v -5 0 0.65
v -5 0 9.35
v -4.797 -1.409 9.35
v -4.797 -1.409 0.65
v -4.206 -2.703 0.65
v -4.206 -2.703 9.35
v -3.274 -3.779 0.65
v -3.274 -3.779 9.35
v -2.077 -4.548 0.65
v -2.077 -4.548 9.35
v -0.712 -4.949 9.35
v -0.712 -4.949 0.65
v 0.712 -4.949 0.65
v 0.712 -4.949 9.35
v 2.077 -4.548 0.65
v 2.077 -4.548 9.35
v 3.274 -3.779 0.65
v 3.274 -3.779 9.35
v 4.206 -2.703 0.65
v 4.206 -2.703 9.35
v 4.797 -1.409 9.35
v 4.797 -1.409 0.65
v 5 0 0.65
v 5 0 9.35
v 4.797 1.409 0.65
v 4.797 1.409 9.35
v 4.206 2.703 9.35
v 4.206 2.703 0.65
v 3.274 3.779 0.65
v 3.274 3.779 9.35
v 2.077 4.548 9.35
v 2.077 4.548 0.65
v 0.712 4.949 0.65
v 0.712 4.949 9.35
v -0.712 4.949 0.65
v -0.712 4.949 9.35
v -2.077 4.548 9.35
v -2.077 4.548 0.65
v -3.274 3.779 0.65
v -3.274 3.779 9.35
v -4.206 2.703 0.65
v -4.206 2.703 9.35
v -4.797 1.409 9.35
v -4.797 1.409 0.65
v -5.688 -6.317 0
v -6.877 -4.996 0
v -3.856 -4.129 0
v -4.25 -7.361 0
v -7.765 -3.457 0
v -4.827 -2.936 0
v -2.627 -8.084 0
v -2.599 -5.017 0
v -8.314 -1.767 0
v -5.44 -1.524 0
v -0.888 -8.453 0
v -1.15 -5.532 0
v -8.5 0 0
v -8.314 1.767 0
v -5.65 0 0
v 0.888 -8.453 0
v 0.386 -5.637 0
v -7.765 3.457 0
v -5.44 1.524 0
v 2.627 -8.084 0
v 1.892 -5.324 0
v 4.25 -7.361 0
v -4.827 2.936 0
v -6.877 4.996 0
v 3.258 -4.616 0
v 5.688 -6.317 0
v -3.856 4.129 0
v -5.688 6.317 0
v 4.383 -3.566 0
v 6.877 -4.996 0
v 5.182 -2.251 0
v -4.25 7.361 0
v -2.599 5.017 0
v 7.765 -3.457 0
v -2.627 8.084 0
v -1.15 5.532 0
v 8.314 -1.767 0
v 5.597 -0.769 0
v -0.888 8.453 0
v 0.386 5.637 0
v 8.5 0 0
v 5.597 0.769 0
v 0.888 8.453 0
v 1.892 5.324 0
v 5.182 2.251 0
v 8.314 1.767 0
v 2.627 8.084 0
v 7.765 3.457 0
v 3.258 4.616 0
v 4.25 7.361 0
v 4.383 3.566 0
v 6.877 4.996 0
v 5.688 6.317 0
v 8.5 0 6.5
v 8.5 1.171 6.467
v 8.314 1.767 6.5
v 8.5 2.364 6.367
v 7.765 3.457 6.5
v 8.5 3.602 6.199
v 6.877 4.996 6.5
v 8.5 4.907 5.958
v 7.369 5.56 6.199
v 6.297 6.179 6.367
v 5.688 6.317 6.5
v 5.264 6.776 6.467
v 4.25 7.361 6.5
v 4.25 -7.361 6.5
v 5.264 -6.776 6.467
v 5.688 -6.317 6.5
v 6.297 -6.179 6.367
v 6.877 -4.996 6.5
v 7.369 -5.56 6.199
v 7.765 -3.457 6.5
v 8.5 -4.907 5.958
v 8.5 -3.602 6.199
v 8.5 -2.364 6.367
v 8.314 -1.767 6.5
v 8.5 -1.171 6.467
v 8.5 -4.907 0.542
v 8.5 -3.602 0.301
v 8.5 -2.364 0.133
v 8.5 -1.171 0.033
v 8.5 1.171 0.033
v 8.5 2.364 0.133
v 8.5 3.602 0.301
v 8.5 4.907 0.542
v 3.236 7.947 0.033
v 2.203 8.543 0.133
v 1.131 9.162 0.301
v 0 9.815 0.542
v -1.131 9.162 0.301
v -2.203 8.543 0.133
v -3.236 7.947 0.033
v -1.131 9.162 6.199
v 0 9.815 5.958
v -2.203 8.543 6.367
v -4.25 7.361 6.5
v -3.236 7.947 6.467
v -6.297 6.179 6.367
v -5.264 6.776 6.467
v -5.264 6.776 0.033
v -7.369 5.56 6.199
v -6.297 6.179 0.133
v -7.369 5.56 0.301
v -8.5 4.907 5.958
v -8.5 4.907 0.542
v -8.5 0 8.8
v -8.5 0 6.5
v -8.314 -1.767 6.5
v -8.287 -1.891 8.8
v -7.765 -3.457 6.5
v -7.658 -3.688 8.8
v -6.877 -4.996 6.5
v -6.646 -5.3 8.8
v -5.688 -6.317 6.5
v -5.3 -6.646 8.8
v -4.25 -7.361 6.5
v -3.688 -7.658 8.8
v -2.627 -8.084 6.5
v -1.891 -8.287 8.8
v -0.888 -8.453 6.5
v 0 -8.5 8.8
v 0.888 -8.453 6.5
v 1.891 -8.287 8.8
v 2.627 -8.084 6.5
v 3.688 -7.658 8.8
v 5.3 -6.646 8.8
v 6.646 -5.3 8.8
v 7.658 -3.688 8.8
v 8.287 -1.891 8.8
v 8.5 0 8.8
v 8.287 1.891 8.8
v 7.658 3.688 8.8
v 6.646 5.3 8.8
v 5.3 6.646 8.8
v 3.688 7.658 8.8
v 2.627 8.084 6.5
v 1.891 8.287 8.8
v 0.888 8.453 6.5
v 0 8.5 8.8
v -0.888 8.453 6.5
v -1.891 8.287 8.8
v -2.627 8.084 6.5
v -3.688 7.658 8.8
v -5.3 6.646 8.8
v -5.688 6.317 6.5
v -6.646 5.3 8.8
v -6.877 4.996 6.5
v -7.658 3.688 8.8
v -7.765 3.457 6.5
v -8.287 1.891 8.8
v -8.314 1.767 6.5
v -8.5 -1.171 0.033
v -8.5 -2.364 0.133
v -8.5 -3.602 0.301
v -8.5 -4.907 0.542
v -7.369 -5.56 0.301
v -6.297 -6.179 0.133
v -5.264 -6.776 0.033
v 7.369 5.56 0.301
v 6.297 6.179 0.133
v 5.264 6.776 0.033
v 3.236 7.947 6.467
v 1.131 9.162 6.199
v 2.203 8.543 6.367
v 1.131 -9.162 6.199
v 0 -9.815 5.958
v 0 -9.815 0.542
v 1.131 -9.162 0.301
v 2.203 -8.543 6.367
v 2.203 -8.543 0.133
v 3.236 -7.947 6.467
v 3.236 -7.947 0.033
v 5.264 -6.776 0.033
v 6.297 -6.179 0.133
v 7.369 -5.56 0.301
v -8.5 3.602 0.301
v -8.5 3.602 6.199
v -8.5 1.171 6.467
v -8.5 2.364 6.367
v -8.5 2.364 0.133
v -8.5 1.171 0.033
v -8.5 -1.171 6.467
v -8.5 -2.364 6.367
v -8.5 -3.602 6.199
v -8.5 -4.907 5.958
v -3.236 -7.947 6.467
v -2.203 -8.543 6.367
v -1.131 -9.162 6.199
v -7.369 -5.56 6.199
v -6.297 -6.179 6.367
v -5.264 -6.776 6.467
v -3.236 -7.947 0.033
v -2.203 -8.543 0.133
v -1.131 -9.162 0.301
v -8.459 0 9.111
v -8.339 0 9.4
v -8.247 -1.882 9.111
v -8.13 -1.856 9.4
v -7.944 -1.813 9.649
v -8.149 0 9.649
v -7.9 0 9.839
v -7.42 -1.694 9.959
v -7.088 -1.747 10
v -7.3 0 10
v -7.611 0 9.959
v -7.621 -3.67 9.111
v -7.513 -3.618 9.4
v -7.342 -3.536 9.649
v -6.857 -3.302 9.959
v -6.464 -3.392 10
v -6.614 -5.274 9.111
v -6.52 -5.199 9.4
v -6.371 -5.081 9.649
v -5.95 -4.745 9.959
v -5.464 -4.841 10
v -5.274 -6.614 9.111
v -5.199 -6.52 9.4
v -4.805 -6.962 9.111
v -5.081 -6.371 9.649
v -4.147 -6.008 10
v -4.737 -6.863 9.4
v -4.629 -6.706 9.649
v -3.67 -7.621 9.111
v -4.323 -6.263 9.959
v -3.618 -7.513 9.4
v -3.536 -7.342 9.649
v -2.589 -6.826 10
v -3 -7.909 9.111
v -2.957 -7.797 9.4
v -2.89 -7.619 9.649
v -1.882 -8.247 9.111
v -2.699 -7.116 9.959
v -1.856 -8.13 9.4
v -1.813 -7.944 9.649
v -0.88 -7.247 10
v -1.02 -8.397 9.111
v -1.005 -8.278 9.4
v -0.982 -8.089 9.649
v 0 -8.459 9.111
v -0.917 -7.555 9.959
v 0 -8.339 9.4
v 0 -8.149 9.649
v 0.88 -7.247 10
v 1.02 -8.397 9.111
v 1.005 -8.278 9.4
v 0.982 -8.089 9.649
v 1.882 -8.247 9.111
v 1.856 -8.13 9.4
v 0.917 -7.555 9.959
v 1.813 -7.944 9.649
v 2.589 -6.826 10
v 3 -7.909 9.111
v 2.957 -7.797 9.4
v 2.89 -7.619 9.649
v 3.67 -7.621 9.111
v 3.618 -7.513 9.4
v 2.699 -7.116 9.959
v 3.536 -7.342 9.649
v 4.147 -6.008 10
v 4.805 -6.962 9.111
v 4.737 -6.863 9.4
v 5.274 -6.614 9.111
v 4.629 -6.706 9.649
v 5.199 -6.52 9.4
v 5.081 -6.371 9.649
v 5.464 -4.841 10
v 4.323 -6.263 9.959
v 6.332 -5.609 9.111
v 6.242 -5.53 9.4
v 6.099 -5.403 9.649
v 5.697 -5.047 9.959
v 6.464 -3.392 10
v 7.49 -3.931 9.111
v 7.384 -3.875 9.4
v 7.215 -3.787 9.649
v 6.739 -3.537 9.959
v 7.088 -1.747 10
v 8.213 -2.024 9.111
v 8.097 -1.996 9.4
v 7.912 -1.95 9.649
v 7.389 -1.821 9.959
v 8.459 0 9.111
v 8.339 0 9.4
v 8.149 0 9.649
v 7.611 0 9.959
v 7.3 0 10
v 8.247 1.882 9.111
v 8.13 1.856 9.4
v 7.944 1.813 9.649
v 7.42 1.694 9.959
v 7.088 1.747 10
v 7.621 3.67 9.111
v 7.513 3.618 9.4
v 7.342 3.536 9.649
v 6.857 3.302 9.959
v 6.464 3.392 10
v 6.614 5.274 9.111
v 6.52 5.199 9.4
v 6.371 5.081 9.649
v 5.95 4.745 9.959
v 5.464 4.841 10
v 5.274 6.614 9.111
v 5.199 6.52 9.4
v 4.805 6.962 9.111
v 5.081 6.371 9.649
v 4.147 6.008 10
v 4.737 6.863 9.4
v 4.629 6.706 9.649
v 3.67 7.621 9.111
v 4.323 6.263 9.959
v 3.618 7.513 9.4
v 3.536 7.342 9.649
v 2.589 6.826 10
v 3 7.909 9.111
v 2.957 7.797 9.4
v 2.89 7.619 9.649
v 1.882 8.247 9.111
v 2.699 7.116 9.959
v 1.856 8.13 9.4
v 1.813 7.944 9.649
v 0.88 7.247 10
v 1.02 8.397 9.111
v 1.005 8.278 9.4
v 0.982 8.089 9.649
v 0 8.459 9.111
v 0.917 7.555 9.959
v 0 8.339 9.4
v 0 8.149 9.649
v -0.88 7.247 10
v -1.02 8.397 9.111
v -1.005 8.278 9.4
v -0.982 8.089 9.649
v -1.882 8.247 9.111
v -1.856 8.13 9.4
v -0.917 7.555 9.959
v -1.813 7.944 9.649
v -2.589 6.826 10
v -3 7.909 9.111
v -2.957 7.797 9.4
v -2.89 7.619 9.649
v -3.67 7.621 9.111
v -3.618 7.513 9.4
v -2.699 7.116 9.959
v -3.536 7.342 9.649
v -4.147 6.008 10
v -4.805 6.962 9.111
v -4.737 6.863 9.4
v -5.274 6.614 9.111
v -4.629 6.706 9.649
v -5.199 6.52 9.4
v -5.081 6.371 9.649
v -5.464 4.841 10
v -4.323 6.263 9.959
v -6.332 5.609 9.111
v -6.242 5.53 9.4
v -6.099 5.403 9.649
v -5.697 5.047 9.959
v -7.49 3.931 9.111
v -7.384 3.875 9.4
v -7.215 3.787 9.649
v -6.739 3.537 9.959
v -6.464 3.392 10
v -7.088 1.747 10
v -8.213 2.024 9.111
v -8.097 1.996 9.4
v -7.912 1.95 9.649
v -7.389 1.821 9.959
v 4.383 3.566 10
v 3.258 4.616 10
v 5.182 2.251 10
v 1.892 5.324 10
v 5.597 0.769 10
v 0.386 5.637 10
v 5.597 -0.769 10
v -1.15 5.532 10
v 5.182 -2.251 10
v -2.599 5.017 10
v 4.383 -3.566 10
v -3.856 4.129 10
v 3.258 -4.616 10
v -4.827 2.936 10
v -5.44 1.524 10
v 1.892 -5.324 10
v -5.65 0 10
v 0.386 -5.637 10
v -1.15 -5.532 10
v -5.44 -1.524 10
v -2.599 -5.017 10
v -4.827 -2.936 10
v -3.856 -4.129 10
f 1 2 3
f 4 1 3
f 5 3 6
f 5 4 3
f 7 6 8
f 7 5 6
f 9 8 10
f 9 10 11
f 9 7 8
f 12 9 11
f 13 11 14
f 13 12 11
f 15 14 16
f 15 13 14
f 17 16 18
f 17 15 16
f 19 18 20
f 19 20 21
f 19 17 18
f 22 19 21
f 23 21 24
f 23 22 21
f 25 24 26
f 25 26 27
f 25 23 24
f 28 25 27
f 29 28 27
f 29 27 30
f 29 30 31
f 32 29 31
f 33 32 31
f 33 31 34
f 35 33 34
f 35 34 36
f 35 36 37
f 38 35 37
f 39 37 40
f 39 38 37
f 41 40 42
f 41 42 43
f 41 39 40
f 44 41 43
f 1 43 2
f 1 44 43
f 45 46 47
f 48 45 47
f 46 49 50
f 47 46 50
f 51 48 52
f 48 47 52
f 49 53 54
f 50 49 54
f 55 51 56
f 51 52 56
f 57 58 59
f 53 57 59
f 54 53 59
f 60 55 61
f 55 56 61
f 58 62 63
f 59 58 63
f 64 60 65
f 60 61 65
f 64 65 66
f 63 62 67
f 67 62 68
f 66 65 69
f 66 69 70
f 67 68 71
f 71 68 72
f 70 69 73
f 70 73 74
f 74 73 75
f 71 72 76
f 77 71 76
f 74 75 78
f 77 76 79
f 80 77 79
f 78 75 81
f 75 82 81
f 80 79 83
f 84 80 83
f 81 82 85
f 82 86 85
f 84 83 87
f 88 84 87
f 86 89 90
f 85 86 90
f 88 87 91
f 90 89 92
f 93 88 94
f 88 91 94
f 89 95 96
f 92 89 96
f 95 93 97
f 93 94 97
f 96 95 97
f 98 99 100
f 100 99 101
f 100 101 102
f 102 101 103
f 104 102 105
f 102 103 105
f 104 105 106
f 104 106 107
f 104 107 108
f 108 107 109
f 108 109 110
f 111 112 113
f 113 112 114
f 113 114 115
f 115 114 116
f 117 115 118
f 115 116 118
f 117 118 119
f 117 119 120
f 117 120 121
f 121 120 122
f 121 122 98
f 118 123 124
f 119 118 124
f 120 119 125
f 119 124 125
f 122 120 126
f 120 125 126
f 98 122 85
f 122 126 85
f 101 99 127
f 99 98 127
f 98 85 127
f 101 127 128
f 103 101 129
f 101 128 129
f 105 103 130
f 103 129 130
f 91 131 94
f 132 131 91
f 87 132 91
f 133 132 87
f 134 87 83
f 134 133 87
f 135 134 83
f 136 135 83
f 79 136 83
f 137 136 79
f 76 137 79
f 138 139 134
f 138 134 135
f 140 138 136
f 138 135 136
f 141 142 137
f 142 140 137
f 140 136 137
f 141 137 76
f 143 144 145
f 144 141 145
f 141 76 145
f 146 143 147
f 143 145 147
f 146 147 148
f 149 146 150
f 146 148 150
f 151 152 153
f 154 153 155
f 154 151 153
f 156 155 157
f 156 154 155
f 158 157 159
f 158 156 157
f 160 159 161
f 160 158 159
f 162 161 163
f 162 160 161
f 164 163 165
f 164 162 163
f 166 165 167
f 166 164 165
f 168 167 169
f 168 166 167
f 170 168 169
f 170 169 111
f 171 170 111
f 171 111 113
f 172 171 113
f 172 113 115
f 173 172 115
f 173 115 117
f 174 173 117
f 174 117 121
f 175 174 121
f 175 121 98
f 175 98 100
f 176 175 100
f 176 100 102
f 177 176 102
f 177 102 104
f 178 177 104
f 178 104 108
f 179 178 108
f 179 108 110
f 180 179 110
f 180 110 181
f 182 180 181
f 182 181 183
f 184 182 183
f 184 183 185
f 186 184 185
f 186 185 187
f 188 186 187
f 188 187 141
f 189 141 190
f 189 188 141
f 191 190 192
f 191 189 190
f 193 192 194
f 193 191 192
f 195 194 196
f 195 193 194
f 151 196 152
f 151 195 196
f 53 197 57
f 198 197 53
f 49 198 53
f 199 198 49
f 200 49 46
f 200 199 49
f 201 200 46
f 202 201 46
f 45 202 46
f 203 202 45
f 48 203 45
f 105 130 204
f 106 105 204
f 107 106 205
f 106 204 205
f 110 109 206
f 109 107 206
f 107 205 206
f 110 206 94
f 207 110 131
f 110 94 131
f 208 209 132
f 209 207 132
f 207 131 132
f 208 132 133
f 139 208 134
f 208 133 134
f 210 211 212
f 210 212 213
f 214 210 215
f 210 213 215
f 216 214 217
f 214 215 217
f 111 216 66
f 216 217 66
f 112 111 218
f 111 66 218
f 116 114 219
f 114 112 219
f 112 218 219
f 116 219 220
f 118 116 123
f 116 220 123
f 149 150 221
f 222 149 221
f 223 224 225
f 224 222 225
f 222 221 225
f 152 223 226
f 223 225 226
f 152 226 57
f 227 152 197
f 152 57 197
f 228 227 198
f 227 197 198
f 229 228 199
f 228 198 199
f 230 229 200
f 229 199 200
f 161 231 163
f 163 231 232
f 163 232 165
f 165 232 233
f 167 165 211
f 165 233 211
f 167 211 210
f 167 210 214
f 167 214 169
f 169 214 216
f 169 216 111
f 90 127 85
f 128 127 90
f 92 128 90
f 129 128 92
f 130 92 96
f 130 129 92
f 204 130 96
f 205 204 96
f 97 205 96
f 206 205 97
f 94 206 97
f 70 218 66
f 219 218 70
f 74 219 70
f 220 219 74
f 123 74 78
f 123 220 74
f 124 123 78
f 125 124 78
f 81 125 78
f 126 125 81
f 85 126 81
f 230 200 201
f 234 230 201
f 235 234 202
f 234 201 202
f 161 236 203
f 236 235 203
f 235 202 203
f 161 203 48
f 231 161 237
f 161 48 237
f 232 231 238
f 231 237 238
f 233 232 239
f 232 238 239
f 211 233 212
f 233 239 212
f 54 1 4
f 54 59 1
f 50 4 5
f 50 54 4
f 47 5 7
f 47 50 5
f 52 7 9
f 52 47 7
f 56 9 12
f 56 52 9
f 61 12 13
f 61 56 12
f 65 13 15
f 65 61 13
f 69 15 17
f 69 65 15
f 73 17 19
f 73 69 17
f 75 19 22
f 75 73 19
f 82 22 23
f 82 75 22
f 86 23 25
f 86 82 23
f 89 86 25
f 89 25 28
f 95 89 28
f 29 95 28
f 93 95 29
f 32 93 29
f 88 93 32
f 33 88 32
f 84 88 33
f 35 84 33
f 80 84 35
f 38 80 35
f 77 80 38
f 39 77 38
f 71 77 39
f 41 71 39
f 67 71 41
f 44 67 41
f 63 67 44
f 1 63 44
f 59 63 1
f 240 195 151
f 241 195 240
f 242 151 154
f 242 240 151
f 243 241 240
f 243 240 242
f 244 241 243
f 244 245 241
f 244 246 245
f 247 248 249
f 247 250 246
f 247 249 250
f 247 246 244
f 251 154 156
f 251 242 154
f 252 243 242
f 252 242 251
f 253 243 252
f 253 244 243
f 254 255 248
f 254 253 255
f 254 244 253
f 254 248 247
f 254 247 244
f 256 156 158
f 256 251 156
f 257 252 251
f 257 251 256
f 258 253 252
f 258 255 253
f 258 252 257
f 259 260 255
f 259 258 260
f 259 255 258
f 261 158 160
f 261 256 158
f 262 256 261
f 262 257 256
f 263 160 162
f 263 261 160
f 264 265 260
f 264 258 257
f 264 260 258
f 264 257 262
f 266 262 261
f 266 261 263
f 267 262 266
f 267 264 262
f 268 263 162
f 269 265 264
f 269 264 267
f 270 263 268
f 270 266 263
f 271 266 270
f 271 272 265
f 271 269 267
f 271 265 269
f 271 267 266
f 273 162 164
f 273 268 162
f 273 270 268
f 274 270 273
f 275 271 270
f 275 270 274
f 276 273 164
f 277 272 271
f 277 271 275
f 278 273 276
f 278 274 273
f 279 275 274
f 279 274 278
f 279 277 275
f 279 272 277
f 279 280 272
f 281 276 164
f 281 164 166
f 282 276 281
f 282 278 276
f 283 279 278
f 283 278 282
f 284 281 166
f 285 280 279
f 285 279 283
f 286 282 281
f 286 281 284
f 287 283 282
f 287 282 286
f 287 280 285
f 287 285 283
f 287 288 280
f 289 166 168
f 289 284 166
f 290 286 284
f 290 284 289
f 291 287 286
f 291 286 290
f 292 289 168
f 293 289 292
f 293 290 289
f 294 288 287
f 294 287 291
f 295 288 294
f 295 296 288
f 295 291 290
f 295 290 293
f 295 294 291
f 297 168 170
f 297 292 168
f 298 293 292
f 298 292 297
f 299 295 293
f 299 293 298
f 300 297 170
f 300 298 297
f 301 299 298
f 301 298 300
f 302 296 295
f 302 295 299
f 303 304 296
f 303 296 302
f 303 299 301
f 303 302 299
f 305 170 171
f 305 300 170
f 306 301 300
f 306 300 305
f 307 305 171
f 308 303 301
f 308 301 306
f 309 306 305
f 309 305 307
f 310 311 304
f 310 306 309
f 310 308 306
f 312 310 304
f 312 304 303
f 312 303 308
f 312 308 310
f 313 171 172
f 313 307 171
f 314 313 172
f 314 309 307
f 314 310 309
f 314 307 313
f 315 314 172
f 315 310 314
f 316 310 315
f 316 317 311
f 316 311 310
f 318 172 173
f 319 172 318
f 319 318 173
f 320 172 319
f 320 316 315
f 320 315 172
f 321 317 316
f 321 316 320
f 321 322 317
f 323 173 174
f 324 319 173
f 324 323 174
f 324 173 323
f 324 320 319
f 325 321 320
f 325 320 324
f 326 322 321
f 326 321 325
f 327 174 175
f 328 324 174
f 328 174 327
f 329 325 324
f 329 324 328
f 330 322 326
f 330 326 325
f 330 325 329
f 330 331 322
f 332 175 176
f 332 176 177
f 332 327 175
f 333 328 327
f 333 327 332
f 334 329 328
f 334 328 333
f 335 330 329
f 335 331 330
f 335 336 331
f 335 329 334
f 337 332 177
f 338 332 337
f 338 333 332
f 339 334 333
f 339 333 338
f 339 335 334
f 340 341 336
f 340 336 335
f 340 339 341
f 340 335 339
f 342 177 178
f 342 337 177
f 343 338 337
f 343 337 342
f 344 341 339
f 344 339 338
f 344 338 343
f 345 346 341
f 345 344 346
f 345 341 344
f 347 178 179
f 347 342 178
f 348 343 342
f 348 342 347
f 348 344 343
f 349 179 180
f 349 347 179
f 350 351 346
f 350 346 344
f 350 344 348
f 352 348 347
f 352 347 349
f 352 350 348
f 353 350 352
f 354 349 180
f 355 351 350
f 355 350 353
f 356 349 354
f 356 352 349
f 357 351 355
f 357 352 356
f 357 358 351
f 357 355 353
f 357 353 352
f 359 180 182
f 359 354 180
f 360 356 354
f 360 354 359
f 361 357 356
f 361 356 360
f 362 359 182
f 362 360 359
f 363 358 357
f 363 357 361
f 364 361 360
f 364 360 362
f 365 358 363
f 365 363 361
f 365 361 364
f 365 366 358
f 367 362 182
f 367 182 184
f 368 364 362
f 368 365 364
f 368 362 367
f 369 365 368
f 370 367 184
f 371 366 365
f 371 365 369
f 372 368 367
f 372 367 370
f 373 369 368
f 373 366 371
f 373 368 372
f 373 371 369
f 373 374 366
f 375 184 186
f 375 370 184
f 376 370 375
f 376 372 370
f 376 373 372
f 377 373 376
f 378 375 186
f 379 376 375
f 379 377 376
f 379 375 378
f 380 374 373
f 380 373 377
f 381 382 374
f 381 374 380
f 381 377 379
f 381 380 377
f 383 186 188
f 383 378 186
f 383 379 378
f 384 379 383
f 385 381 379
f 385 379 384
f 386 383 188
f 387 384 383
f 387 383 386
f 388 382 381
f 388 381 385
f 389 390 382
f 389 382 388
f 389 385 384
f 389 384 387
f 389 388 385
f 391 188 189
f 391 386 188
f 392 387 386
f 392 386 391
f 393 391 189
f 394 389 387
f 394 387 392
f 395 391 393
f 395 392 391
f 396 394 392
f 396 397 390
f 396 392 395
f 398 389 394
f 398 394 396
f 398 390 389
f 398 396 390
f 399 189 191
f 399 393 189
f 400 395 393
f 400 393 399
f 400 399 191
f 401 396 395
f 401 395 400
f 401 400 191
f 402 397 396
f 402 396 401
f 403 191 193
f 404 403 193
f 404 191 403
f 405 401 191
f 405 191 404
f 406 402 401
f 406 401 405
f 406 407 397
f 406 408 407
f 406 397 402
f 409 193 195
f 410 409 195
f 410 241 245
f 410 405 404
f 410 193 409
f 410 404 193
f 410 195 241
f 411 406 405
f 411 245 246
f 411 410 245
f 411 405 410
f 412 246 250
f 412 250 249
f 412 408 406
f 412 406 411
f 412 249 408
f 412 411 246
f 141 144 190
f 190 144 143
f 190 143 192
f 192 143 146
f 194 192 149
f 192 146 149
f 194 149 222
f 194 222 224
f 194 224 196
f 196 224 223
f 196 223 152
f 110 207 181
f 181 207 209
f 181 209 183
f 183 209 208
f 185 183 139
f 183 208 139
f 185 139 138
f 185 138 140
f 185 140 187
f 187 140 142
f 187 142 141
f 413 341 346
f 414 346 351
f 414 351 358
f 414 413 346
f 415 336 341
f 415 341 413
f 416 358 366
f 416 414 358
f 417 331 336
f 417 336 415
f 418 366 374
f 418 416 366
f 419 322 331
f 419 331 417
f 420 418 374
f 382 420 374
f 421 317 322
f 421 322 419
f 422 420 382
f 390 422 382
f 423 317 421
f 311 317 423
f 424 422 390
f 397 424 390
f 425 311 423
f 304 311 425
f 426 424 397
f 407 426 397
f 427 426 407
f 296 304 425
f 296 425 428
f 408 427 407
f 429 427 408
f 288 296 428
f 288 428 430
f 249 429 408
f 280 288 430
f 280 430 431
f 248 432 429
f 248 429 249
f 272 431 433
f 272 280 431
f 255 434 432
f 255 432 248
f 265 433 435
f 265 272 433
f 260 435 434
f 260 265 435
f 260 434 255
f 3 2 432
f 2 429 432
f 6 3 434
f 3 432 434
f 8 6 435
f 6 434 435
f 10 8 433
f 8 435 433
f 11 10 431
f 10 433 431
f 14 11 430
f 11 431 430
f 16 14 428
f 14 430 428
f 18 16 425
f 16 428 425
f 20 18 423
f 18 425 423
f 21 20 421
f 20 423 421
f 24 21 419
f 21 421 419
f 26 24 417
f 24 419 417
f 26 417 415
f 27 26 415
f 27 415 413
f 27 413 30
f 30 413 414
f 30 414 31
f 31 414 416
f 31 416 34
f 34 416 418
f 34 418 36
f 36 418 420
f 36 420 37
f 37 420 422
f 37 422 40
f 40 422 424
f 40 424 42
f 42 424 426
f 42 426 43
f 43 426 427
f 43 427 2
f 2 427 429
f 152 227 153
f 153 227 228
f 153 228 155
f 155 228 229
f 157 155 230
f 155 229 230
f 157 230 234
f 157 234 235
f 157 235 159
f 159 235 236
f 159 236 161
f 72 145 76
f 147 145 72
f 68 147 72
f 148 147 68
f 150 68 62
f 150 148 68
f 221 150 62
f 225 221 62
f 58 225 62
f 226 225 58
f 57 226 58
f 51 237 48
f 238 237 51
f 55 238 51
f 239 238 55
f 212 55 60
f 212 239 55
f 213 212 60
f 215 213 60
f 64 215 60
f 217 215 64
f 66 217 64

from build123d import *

# Parameters (mm, degrees)
SKETCH1_R           = 5
BOSS_EXTRUDE1_DEPTH = 6.5


with BuildPart() as part:
    # Sketch1 → Boss-Extrude1 (new body)
    with BuildSketch(Plane.XY):
        Polygon((0, -9.814954576), (8.5, -4.907477288), (8.5, 4.907477288), (0, 9.814954576), (-8.5, 4.907477288), (-8.5, -4.907477288), align=None)
        with Locations(Location((0, 0, 0), (0, 0, 180))):
            Circle(SKETCH1_R, mode=Mode.SUBTRACT)
    extrude(amount=BOSS_EXTRUDE1_DEPTH)

    # Sketch3 → Revolve1 (revolve)
    with BuildSketch(Plane(origin=(0, 0, 0), x_dir=(0, 0, -1), z_dir=(0, 1, 0))):
        with BuildLine():
            Line((-6.5, 8.5), (-8.8, 8.5))
            ThreePointArc((-8.8, 8.5), (-9.648528137, 8.148528137), (-10, 7.3))
            Line((-10, 7.3), (-10, 5))
            Line((-10, 5), (-6.5, 5))
            Line((-6.5, 5), (-6.5, 8.5))
        make_face()
    revolve(axis=Axis((0, 0, 0), (0, 0, 1)))

    # Sketch2 → Cut-Revolve1 (revolve, cut)
    with BuildSketch(Plane(origin=(0, 0, 0), x_dir=(0, 0, -1), z_dir=(1, 0, 0)), mode=Mode.PRIVATE) as cut_revolve1_sk:
        Polygon((-6.5, 9.814954576), (-6.5, 8.5), (-5.958333333, 9.814954576), align=None)
        Polygon((-0.541666667, 9.814954576), (0, 9.814954576), (0, 8.5), align=None)
        Polygon((-10, 5), (-9.35, 5), (-10, 5.65), align=None)
        Polygon((0, 5), (-0.65, 5), (0, 5.65), align=None)
    revolve(cut_revolve1_sk.sketch.rotate(Axis((0, 0, 0), (0, 0, 1)), 90), axis=Axis((0, 0, 0), (0, 0, 1)), mode=Mode.SUBTRACT)


solid = part.part
